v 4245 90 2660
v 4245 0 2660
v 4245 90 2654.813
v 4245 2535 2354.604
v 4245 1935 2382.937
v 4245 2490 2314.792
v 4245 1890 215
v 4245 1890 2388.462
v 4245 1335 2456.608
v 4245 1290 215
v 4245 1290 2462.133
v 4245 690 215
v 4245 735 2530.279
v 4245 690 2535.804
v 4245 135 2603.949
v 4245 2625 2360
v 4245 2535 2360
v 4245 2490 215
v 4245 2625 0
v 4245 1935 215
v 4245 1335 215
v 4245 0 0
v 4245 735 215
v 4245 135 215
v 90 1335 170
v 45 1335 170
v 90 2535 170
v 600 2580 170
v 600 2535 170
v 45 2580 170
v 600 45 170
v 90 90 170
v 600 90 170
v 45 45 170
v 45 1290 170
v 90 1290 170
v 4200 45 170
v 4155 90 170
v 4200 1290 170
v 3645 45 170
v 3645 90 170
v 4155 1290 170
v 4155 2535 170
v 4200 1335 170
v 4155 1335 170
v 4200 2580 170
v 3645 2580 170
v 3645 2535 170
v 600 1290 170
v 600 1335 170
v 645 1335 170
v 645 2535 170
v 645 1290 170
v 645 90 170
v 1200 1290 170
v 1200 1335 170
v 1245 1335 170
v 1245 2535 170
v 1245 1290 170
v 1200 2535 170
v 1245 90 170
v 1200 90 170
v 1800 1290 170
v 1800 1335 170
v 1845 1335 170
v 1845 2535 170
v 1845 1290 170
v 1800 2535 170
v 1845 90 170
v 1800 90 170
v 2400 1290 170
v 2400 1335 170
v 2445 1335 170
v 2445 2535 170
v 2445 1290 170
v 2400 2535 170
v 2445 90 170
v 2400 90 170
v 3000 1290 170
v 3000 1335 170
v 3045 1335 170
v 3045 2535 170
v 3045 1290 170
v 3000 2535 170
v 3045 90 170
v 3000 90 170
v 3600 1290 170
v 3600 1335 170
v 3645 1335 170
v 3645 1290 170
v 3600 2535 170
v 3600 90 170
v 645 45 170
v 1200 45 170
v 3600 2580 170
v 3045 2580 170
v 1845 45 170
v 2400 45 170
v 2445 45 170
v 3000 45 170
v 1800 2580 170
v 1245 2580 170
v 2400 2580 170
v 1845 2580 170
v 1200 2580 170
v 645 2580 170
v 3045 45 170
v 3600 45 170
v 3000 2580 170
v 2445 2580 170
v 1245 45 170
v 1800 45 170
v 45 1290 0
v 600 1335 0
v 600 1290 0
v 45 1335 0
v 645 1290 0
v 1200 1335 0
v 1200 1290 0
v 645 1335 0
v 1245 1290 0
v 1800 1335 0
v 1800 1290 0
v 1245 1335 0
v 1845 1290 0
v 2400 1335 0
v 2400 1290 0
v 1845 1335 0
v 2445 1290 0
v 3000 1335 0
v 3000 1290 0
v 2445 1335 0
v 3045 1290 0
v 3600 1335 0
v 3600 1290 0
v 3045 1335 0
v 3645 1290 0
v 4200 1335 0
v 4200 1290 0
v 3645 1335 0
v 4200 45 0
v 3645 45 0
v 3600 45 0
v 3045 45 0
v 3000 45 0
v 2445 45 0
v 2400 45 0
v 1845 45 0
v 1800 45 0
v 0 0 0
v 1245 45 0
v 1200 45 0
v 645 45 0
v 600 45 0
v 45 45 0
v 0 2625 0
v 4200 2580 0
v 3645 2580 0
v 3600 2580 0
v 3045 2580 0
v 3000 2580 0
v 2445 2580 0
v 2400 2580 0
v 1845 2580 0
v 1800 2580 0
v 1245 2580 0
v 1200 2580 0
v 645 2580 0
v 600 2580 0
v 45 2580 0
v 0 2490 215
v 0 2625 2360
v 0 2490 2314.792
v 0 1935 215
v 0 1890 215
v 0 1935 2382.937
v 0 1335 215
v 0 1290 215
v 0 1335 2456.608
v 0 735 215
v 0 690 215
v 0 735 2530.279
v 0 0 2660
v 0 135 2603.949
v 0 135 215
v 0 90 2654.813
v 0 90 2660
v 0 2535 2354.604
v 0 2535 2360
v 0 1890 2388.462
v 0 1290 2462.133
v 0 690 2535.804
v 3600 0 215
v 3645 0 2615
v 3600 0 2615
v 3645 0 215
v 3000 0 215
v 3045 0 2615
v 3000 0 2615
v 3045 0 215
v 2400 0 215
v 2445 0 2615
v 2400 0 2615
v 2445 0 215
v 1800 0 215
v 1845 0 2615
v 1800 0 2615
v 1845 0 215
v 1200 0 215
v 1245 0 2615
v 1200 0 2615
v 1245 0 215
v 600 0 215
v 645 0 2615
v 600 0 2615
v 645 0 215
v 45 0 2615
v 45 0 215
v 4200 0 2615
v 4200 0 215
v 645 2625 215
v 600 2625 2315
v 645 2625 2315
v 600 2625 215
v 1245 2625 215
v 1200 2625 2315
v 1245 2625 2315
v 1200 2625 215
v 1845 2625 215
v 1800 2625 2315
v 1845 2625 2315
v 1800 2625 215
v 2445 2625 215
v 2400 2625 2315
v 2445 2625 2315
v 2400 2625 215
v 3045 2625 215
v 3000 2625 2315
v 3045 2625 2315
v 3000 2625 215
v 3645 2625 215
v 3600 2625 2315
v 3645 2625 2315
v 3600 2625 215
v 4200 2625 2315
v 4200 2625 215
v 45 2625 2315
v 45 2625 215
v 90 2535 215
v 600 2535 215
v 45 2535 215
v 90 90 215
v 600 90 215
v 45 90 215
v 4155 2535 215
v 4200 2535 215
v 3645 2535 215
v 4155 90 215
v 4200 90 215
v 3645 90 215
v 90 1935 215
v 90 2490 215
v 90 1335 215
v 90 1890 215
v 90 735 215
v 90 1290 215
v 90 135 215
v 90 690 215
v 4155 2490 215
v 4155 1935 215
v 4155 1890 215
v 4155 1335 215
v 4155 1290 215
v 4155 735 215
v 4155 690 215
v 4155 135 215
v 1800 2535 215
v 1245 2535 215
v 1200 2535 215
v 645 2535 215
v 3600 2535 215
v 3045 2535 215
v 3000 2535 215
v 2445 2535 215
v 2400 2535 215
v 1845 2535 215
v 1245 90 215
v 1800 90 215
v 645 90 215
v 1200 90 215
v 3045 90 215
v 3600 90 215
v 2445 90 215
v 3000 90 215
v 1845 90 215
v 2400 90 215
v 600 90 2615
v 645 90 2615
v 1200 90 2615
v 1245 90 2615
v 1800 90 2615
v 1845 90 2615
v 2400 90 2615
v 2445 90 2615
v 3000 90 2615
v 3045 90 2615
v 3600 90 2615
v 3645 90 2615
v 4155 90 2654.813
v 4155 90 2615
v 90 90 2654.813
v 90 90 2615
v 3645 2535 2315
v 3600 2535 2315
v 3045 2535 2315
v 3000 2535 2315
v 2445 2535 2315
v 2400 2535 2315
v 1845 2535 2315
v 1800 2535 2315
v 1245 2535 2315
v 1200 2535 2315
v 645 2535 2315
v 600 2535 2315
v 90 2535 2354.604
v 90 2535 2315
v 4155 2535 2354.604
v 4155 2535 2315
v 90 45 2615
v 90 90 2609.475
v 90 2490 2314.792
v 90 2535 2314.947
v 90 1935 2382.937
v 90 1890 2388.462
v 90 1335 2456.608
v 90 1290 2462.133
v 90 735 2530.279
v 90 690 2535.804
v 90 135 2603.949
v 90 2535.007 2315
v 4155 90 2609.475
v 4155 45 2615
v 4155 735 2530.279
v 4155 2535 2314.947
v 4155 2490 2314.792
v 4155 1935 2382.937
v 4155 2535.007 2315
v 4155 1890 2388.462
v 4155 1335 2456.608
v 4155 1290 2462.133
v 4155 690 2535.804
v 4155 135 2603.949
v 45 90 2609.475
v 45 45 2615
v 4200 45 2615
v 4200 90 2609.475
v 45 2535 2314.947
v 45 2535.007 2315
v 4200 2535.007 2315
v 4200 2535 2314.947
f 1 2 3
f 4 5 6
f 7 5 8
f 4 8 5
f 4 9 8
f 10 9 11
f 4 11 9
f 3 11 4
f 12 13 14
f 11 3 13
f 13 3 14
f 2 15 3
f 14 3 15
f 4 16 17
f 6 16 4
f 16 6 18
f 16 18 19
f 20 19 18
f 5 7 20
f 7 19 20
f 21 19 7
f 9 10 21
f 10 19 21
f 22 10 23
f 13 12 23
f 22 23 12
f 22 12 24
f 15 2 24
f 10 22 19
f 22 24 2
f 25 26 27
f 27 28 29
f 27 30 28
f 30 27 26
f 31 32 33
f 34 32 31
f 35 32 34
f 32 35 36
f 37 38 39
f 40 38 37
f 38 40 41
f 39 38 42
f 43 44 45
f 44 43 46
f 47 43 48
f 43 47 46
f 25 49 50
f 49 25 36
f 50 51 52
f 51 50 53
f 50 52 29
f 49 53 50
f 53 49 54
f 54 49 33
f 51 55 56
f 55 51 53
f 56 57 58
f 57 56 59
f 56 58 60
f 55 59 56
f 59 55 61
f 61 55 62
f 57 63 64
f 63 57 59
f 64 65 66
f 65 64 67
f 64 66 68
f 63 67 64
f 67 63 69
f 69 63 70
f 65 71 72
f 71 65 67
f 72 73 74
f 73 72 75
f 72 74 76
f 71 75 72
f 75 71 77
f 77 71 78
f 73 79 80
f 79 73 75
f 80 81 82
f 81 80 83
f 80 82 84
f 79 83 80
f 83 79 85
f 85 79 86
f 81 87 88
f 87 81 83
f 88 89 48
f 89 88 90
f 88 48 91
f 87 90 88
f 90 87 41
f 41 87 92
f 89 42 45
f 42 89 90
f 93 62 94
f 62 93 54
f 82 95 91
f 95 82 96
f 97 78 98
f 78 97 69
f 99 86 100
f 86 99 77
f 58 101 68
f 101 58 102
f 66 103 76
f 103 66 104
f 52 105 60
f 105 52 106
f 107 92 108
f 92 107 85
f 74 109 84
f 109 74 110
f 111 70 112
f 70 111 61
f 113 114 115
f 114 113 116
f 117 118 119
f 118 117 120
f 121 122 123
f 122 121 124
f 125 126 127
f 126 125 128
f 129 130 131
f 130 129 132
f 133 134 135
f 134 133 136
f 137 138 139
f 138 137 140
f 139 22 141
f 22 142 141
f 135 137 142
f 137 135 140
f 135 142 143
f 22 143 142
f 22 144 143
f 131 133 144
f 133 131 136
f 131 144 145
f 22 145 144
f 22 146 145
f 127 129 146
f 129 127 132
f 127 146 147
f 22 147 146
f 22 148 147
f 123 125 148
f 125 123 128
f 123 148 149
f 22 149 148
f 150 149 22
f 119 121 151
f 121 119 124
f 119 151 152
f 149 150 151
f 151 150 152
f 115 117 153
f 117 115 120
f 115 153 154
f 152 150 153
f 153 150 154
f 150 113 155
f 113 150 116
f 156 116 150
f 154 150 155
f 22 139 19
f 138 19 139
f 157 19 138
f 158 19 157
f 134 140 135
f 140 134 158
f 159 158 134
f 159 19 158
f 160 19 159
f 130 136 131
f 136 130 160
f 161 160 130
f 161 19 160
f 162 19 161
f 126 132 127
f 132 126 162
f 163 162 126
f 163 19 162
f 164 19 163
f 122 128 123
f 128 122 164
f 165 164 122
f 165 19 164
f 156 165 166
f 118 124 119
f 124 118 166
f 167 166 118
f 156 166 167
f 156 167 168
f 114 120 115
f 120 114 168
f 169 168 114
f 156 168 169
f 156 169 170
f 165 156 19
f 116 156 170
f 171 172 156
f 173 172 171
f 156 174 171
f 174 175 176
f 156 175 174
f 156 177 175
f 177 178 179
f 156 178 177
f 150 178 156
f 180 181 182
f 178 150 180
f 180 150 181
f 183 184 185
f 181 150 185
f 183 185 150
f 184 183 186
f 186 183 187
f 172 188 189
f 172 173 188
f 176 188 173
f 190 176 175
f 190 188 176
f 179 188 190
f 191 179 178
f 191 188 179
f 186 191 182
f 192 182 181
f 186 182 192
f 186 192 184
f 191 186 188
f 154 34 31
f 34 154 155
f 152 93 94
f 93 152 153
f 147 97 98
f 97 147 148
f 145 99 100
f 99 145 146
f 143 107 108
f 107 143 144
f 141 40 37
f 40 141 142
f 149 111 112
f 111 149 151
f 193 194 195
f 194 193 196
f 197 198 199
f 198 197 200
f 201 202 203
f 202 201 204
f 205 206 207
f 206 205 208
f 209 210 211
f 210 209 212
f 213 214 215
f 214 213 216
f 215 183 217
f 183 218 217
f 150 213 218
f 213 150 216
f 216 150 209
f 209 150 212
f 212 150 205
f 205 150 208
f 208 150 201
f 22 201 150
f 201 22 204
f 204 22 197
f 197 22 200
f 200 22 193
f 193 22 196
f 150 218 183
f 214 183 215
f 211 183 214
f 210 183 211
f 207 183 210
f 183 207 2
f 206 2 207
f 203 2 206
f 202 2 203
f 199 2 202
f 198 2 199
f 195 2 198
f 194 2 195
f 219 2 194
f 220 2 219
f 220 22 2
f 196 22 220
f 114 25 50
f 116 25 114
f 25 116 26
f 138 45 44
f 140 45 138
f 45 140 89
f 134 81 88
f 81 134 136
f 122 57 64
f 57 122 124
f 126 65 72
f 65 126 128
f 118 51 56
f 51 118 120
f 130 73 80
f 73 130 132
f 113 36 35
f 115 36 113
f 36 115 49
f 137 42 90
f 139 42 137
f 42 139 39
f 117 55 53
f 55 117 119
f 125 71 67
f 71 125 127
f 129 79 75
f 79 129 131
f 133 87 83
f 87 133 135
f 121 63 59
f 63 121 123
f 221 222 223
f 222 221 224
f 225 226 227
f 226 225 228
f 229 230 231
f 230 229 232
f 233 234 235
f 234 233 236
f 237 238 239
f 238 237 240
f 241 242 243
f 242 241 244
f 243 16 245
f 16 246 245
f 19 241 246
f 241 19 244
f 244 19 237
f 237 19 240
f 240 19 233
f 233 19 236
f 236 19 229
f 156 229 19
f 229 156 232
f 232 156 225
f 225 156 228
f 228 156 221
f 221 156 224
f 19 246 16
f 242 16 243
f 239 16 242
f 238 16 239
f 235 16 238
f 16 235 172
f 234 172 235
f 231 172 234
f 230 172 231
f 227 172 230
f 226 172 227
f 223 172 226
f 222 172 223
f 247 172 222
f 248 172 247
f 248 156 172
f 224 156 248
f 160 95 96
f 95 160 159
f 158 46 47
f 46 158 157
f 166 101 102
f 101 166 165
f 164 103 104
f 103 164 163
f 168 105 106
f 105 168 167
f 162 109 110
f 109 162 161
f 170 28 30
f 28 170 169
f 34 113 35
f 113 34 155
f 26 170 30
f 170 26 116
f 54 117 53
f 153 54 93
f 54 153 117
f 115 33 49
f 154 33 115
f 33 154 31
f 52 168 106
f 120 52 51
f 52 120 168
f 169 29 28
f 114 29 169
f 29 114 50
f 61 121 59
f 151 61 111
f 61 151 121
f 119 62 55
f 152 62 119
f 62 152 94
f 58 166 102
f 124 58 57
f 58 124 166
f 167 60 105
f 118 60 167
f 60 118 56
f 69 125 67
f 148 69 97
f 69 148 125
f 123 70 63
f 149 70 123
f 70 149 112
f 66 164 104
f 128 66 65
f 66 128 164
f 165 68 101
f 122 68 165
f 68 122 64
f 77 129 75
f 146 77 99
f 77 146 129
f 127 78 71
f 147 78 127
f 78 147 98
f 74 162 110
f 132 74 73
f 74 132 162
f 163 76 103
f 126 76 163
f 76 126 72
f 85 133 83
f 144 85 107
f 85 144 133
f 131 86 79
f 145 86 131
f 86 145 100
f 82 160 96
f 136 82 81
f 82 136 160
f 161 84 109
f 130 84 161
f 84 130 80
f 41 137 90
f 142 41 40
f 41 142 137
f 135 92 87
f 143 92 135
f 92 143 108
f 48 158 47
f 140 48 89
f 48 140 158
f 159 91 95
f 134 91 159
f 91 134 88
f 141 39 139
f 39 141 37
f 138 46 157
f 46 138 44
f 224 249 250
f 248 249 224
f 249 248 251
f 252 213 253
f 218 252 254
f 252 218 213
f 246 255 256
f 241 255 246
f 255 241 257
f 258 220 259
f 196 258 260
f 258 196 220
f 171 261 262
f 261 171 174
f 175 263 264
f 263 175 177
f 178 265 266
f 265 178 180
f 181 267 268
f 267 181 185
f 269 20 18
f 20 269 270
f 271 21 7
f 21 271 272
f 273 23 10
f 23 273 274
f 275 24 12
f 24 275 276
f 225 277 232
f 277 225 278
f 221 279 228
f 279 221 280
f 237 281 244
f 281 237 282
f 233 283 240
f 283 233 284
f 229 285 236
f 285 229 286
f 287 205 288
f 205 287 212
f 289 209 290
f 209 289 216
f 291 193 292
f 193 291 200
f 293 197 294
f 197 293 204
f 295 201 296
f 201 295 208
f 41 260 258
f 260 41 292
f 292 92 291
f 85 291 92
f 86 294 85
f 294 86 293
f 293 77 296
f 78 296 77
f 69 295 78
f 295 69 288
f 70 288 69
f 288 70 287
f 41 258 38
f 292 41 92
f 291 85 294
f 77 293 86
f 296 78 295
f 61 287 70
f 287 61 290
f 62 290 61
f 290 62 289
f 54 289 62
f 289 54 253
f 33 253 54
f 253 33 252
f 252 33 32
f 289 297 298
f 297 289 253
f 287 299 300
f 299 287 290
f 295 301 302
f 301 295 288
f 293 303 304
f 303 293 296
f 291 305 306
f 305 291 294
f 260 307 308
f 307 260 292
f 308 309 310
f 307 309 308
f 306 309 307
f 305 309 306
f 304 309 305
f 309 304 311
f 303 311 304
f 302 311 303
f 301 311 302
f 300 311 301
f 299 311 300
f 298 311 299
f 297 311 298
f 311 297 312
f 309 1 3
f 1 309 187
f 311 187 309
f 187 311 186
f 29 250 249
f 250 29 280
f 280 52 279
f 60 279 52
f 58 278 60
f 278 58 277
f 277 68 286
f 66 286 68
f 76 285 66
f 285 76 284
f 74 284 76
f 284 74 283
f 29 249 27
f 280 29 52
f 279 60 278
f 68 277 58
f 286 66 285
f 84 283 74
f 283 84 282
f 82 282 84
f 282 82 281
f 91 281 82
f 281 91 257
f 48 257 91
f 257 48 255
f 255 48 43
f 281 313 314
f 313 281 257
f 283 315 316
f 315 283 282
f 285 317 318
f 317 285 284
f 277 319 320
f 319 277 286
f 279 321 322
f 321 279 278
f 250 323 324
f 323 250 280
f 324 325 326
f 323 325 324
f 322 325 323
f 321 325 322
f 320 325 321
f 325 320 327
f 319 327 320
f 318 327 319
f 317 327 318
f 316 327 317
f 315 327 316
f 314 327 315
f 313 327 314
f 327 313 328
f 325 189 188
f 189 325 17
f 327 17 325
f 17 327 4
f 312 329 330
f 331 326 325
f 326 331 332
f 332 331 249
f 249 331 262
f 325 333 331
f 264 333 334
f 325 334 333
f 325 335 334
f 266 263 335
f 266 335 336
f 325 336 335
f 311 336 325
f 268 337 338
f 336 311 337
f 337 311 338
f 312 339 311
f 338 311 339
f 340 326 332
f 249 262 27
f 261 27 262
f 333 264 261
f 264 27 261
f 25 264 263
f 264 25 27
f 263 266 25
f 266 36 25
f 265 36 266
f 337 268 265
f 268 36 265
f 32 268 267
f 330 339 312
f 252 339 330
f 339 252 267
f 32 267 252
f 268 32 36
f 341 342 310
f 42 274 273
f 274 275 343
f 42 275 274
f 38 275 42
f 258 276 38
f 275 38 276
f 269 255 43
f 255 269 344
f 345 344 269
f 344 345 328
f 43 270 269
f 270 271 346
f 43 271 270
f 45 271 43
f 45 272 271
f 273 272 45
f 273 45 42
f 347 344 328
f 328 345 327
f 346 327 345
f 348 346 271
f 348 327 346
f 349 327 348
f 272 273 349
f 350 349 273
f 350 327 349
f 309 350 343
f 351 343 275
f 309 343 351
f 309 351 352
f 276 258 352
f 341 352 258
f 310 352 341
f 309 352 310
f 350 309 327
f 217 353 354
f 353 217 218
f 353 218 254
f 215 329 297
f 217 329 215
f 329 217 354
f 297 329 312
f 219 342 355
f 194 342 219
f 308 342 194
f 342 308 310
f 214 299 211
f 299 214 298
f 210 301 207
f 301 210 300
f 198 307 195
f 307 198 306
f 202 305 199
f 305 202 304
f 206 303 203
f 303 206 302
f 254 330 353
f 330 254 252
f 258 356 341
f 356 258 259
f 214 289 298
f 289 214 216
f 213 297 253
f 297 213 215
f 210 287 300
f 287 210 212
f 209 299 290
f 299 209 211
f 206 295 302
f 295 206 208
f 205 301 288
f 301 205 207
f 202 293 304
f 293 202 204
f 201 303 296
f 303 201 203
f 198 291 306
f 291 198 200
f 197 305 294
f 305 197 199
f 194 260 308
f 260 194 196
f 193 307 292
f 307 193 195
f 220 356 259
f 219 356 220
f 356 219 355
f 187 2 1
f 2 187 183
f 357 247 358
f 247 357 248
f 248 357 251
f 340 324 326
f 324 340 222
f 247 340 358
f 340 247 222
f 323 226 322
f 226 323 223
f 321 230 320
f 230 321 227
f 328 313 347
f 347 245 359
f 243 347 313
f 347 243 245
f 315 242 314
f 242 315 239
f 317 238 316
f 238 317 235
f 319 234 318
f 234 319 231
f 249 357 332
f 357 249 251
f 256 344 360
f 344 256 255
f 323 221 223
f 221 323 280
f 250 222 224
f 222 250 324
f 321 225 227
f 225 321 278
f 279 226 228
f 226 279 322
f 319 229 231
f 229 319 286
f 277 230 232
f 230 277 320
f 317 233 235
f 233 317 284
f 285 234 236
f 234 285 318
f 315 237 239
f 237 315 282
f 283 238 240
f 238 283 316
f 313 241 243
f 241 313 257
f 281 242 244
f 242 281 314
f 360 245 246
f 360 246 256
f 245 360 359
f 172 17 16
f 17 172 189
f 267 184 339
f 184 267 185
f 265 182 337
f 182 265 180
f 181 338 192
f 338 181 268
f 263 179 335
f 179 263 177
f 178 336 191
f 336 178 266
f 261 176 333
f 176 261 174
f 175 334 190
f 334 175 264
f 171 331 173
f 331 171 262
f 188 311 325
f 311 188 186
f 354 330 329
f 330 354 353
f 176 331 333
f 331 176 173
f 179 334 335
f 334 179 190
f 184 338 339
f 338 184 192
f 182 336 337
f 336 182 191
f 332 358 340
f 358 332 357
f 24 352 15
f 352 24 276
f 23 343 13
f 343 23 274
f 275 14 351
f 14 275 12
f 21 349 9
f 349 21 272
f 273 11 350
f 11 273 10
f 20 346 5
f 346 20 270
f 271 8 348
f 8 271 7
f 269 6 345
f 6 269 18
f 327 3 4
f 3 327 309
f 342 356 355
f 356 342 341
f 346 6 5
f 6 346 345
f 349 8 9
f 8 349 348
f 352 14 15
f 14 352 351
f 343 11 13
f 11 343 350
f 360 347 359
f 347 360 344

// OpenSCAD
front_width = 4200;
front_height = 2400;

back_width = 4200;
back_height = 2100;

side_width = 2100;

base_depth = 2100;

wall = 100;
roof_height = 300;

door_width = 900;
door_height = 1800;

front_window_width = 1200;
front_window_height = 1200;
front_window_bottom = 600;
front_spacing = (front_width - front_window_width - door_width) / 3;

side_window_width = 1200;
side_window_height = 600;
side_window_bottom = 1200;
side_spacing = (side_width - side_window_width) / 2;

chimney_x = 220;
chimney_y = 220;
chimney_size = 120;
chimney_height = 3000;

$vpt = [400, 200, 1000];
$vpr = [60, 0, 40];
$vpd = 16000;

//offset = [-(front_width + back_width) / 4, -side_width / 2];
//translate(offset) sauna();
sauna();

module sauna() {
    base();
//    translate([0, 0, back_height]) {
//        roof();
//    }
//    chimney();
}

module side_wall()
{
    points = [
        [0, wall, 0],
        [0, wall + side_width, 0],
        [0, wall + side_width, back_height],
        [0, wall, front_height],
        [wall, wall, 0],
        [wall, wall + side_width, 0],
        [wall, wall + side_width, back_height],
        [wall, wall, front_height]
    ];
    faces = [
        [0, 1, 2, 3], [3, 2, 1, 0],
        [4, 5, 6, 7], [7, 6, 5, 4]
    ];

    difference() {
        polyhedron(points, faces, convexity = 10);

        // window hole
        translate([-1, wall + side_spacing, side_window_bottom]) cube([wall + 2, side_window_width, side_window_height]);
    }
}

module bottom(w, d, h)
{
    color() {
        for (i = [0:2]) {
            translate([0, i * (d / 2 + 45), 0]) cube([w + 45, 45, h]);
        }
    }

    color() {
        for (i = [0:7]) {
            translate([i * 600, 45, 0]) cube([45, d / 2, h]);
            translate([i * 600, d / 2 + 2 * 45, 0]) cube([45, d / 2, h]);
        }
    }

    color("green") {
        translate([0, 0, h]) {
            cube([w + 45, 90, 45]);
            translate([0, d + 45, 0]) cube([w + 45, 90, 45]);

            translate([0, 90, 0]) cube([90, d - 45, 45]);
            translate([w - 45, 90, 0]) cube([90, d - 45, 45]);
        }
    }
}

module front_wall(w, h)
{
    color("blue") {
        for (i = [0:7]) {
            translate([i * 600, 0, 0]) cube([45, 90, h]);
        }
    }
    color("magenta") {
        translate([0, 0, h]) cube([w + 45, 90, 45]);
    }
}

module back_wall(w, h)
{
    color("blue") {
        for (i = [0:7]) {
            translate([i * 600, 0, 0]) cube([45, 90, h]);
        }
    }
    color("magenta") {
        translate([0, 0, h]) cube([w + 45, 90, 45]);
    }
}

module side_wall(w, fh, bh)
{
    color("red") {
        for (i = [0:4]) {
            h = fh - (fh - bh) / 4 * i;
            translate([0, i * 600 + 90, 0]) cube([90, 45, h]);
        }
    }
    color("magenta") {
        a = pow(w, 2);
        b = pow(fh - bh, 2);
        l = sqrt(a + b);
        // ### TODO: calculate the angle
        translate([0, 45, fh]) rotate([-7, 0, 0]) cube([90, l, 45]);
    }
}

module base()
{
    w = 4200;
    d = 2400 + 90;
    b = 170;
    fh = 2400;
    bh = 2100;

    bottom(w, d, b);
    translate([0, 0, 170 + 45]) {
        front_wall(w, fh);
        translate([0, d + 45, 0]) back_wall(w, bh);
        side_wall(d, fh, bh);
        translate([w - 45, 0, 0]) side_wall(d, fh, bh);
    }
    
/*    
    difference() {
        color("red") cube([front_width, wall, front_height]);

        // door hole
        translate([front_width - front_spacing - door_width, -1, -1]) cube([door_width, wall + 2, door_height + 1]);
        
        // front window hole
        translate([front_spacing, -1, front_window_bottom]) cube([front_window_width, wall + 2, front_window_height]);
    }

    color("green") translate([0, wall + side_width, 0]) cube([back_width, wall, back_height]);

    color("blue") side_wall();
    color("magenta") translate([front_width - wall, 0, 0]) side_wall();
*/

    /*
    difference() {
        
        // walls
        points = [ 
            [0, 0, 0], // 0
            [front_width, 0, 0], // 1
            [back_width, side_width, 0], // 2
            [0, side_width, 0], // 3
            [0, 0, front_height], // 4
            [front_width, 0, front_height], // 5
            [back_width, side_width, back_height], // 6
            [0, side_width, back_height] // 7
        ];
        faces = [
            [4, 5, 1, 0], [0, 1, 5, 4], // front
            [7, 6, 2, 3], [3, 2, 6, 7], // back
            [4, 7, 3, 0], [0, 3, 7, 4], // side
            [5, 6, 2, 1], [1, 2, 6, 5] // side
        ];
        color("white") polyhedron(points, faces, convexity = 10);

        // door hole
        translate([front_width - front_spacing - door_width, -1, -1]) cube([door_width, wall + 2, door_height + 1]);
    }
    */
/*
    difference() {
        // shell
        color("white") cube([base_width, base_depth, back_height]);
        translate([wall, wall, -1]) cube([base_width - 2 * wall, base_depth - 2 * wall, back_height + 2]);

        // door hole
        translate([base_width - front_spacing - door_width, -1, -1]) cube([door_width, wall + 2, door_height + 1]);

        // front window hole
        translate([front_spacing, -1, front_window_bottom]) cube([front_window_width, wall + 2, front_window_height]);

        // side window hole
        translate([base_width - wall - 1, side_spacing, side_window_bottom]) cube([wall + 2, side_window_width, side_window_height]);

        // back window hole
        translate([-1, side_spacing, side_window_bottom]) cube([wall + 2, side_window_width, side_window_height]);
    }

    // door
    color("gray", 0.75) translate([base_width - front_spacing - door_width, 0, 0]) translate([door_width,0,0]) rotate(45) translate([-door_width,0,0]) cube([door_width, wall / 2, door_height]);

    // front window
    color("gray", 0.25) translate([front_spacing, 0, front_window_bottom]) cube([front_window_width, wall, front_window_height]);

    // side window
    color("gray", 0.25) translate([base_width - wall, side_spacing, side_window_bottom]) cube([wall, side_window_width, side_window_height]);

    // back window
    color("gray", 0.25) translate([0, side_spacing, side_window_bottom]) cube([wall, side_window_width, side_window_height]);
*/
}

module roof() {
/*    points = [ 
        [0, 0, 0],
        [base_width, 0, 0],
        [base_width, base_depth, 0], [0, base_depth, 0], // base corners
        [0, 0, roof_height],
        [base_width, 0, roof_height]      // roof corners
    ];
    faces = [ 
        [0, 1, 2, 3],   // base
        [3, 4, 0],      // left triangle
        [1, 5, 2],      // right triangle
        [4, 5, 1, 0],   // front side,
        [5, 4, 3, 2]    // back side
    ];
    color("darkgray") polyhedron(points, faces, convexity = 10);
*/
}

module chimney() {
    translate([chimney_x, chimney_y, 0]) color("black") cube([chimney_size, chimney_size, chimney_height]);
}

module rcube(size, radius) {
    if(radius < 1){
        cube(size);
    } else {
        hull() {
            translate([radius, radius]) cylinder(r = radius, h = size[2]);
            translate([size[0] - radius, radius]) cylinder(r = radius, h = size[2]);
            translate([size[0] - radius, size[1] - radius]) cylinder(r = radius, h = size[2]);
            translate([radius, size[1] - radius]) cylinder(r = radius, h = size[2]);
        }
    }
}
